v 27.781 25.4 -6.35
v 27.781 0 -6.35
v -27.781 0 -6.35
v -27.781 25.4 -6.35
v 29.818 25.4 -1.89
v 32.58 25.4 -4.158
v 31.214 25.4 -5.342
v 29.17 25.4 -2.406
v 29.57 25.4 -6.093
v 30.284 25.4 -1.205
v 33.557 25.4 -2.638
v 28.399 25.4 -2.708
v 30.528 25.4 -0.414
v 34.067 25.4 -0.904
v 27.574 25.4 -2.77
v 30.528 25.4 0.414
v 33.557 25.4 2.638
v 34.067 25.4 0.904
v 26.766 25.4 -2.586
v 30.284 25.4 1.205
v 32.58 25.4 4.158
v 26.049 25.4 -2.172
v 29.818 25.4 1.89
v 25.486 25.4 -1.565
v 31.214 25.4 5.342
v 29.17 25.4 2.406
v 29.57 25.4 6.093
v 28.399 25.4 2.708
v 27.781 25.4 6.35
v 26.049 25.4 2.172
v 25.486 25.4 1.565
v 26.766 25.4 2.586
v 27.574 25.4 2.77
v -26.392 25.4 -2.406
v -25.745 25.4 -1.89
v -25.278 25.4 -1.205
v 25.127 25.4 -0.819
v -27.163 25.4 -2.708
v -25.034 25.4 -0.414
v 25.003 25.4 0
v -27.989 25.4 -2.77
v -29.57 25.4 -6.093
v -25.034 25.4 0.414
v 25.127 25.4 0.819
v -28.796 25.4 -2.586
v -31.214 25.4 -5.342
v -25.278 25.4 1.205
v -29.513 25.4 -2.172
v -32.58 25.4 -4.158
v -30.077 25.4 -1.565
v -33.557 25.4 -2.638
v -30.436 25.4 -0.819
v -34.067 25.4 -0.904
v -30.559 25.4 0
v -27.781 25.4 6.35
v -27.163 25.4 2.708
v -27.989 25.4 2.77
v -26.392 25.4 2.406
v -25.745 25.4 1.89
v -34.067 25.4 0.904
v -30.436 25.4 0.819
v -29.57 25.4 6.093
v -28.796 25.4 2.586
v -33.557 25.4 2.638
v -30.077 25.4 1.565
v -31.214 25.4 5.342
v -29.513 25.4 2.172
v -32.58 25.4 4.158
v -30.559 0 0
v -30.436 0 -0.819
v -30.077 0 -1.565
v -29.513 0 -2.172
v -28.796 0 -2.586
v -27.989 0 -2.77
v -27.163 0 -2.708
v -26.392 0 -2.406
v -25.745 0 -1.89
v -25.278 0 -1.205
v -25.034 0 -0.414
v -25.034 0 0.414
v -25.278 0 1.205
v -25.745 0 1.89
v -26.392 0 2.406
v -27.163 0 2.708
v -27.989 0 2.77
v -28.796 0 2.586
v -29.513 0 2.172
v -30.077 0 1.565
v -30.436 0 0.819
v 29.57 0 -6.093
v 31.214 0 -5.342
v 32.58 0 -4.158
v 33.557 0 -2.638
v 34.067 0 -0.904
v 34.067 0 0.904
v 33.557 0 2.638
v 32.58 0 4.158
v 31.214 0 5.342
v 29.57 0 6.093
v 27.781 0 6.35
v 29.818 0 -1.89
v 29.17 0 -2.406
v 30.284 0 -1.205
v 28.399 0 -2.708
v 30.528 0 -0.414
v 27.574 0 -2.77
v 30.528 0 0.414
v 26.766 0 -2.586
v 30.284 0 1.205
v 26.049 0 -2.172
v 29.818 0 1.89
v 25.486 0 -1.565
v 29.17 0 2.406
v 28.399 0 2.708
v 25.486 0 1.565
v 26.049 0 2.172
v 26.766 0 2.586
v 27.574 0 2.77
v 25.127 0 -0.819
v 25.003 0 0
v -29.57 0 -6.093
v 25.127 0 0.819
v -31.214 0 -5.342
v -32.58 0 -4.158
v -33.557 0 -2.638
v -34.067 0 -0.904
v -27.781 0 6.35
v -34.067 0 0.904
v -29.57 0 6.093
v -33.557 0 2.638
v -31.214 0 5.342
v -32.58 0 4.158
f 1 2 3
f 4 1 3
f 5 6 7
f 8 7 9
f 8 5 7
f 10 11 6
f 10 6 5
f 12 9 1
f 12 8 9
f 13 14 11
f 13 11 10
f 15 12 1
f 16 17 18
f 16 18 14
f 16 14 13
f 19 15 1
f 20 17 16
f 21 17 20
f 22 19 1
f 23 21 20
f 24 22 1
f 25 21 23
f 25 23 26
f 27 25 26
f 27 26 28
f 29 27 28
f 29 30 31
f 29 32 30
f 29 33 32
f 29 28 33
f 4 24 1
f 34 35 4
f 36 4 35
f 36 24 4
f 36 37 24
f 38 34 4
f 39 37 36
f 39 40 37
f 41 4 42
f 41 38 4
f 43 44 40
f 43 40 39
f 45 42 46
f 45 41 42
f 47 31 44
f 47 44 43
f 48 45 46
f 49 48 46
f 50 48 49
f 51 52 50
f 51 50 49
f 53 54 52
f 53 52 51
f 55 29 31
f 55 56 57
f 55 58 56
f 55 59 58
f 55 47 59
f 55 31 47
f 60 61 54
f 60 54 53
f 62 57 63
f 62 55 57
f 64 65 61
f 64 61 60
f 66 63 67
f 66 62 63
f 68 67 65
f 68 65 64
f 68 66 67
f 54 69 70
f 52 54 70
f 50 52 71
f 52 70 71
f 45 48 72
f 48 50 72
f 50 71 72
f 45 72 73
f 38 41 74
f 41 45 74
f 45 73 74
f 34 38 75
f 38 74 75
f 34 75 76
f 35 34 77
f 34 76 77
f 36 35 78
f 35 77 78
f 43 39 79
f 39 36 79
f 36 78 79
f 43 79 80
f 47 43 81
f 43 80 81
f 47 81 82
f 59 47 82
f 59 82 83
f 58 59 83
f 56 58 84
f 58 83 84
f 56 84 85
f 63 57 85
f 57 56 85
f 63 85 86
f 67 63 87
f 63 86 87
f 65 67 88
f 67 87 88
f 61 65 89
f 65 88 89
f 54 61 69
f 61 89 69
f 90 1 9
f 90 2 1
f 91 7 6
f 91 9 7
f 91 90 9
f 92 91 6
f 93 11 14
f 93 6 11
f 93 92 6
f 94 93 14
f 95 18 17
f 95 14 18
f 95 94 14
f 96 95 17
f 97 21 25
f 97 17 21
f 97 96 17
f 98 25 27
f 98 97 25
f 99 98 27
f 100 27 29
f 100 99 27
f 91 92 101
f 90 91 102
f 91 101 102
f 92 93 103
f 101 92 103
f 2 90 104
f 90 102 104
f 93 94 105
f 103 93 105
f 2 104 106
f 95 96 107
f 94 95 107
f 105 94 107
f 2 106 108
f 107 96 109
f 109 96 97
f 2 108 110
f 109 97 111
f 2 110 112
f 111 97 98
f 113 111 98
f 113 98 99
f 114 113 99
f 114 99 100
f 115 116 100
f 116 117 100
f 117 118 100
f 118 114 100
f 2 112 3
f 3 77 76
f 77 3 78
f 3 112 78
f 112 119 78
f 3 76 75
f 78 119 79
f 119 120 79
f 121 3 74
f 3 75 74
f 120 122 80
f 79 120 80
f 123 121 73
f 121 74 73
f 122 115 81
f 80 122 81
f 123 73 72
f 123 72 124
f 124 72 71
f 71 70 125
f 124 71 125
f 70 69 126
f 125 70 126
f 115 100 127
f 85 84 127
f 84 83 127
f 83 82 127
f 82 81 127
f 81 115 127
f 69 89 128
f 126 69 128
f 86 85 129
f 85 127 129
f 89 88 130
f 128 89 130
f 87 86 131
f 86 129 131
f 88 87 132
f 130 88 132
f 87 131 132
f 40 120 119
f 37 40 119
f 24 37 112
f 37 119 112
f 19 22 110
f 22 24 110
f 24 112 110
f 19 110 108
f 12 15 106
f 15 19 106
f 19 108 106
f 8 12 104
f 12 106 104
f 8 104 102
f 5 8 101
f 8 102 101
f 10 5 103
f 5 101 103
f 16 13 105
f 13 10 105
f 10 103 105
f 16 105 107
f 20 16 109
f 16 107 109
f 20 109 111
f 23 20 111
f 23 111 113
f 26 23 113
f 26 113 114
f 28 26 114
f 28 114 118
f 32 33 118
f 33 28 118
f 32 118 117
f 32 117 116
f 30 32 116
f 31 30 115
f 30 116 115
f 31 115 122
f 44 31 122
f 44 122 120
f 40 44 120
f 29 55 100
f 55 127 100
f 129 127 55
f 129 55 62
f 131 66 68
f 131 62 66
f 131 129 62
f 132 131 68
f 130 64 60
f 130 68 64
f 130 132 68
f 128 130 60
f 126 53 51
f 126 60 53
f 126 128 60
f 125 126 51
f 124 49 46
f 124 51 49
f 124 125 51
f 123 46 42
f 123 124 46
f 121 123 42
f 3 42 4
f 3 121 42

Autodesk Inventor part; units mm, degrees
ref_plane "YZ Plane" through (0, 0, 0) normal (1, 0, 0) x (0, 1, 0)
ref_plane "XZ Plane" through (0, 0, 0) normal (0, 1, 0) x (-1, 0, 0)
ref_plane "XY Plane" through (0, 0, 0) normal (0, 0, 1) x (1, 0, 0)
sketch "Sketch1" plane through (0, 0, 0) normal (0, 1, 0) x (-1, 0, 0)
  line L0 (-27.7812, 0) -> (27.7812, 0) construction
  line L1 (-27.7812, -6.35) -> (27.7812, -6.35)
  line L2 (27.7812, 6.35) -> (-27.7812, 6.35)
  arc A0 (-27.7812, 6.35) -> (-27.7812, -6.35) centre (-27.7812, 0) ccw
  arc A1 (27.7812, -6.35) -> (27.7812, 6.35) centre (27.7812, 0) ccw
  circle A2 centre (27.7812, 0) radius 2.7781
  circle A3 centre (-27.7812, 0) radius 2.7781
  point P0 (0, 0)
  dimension "d0" = 5.5563
  dimension "d1" = 55.5625
  dimension "d2" = 6.35
extrude "Extrusion1" add sketch "Sketch1" along normal blind 25.4
properties part number "OZZ-CasterRiserBlock" material "Steel, Alloy"
